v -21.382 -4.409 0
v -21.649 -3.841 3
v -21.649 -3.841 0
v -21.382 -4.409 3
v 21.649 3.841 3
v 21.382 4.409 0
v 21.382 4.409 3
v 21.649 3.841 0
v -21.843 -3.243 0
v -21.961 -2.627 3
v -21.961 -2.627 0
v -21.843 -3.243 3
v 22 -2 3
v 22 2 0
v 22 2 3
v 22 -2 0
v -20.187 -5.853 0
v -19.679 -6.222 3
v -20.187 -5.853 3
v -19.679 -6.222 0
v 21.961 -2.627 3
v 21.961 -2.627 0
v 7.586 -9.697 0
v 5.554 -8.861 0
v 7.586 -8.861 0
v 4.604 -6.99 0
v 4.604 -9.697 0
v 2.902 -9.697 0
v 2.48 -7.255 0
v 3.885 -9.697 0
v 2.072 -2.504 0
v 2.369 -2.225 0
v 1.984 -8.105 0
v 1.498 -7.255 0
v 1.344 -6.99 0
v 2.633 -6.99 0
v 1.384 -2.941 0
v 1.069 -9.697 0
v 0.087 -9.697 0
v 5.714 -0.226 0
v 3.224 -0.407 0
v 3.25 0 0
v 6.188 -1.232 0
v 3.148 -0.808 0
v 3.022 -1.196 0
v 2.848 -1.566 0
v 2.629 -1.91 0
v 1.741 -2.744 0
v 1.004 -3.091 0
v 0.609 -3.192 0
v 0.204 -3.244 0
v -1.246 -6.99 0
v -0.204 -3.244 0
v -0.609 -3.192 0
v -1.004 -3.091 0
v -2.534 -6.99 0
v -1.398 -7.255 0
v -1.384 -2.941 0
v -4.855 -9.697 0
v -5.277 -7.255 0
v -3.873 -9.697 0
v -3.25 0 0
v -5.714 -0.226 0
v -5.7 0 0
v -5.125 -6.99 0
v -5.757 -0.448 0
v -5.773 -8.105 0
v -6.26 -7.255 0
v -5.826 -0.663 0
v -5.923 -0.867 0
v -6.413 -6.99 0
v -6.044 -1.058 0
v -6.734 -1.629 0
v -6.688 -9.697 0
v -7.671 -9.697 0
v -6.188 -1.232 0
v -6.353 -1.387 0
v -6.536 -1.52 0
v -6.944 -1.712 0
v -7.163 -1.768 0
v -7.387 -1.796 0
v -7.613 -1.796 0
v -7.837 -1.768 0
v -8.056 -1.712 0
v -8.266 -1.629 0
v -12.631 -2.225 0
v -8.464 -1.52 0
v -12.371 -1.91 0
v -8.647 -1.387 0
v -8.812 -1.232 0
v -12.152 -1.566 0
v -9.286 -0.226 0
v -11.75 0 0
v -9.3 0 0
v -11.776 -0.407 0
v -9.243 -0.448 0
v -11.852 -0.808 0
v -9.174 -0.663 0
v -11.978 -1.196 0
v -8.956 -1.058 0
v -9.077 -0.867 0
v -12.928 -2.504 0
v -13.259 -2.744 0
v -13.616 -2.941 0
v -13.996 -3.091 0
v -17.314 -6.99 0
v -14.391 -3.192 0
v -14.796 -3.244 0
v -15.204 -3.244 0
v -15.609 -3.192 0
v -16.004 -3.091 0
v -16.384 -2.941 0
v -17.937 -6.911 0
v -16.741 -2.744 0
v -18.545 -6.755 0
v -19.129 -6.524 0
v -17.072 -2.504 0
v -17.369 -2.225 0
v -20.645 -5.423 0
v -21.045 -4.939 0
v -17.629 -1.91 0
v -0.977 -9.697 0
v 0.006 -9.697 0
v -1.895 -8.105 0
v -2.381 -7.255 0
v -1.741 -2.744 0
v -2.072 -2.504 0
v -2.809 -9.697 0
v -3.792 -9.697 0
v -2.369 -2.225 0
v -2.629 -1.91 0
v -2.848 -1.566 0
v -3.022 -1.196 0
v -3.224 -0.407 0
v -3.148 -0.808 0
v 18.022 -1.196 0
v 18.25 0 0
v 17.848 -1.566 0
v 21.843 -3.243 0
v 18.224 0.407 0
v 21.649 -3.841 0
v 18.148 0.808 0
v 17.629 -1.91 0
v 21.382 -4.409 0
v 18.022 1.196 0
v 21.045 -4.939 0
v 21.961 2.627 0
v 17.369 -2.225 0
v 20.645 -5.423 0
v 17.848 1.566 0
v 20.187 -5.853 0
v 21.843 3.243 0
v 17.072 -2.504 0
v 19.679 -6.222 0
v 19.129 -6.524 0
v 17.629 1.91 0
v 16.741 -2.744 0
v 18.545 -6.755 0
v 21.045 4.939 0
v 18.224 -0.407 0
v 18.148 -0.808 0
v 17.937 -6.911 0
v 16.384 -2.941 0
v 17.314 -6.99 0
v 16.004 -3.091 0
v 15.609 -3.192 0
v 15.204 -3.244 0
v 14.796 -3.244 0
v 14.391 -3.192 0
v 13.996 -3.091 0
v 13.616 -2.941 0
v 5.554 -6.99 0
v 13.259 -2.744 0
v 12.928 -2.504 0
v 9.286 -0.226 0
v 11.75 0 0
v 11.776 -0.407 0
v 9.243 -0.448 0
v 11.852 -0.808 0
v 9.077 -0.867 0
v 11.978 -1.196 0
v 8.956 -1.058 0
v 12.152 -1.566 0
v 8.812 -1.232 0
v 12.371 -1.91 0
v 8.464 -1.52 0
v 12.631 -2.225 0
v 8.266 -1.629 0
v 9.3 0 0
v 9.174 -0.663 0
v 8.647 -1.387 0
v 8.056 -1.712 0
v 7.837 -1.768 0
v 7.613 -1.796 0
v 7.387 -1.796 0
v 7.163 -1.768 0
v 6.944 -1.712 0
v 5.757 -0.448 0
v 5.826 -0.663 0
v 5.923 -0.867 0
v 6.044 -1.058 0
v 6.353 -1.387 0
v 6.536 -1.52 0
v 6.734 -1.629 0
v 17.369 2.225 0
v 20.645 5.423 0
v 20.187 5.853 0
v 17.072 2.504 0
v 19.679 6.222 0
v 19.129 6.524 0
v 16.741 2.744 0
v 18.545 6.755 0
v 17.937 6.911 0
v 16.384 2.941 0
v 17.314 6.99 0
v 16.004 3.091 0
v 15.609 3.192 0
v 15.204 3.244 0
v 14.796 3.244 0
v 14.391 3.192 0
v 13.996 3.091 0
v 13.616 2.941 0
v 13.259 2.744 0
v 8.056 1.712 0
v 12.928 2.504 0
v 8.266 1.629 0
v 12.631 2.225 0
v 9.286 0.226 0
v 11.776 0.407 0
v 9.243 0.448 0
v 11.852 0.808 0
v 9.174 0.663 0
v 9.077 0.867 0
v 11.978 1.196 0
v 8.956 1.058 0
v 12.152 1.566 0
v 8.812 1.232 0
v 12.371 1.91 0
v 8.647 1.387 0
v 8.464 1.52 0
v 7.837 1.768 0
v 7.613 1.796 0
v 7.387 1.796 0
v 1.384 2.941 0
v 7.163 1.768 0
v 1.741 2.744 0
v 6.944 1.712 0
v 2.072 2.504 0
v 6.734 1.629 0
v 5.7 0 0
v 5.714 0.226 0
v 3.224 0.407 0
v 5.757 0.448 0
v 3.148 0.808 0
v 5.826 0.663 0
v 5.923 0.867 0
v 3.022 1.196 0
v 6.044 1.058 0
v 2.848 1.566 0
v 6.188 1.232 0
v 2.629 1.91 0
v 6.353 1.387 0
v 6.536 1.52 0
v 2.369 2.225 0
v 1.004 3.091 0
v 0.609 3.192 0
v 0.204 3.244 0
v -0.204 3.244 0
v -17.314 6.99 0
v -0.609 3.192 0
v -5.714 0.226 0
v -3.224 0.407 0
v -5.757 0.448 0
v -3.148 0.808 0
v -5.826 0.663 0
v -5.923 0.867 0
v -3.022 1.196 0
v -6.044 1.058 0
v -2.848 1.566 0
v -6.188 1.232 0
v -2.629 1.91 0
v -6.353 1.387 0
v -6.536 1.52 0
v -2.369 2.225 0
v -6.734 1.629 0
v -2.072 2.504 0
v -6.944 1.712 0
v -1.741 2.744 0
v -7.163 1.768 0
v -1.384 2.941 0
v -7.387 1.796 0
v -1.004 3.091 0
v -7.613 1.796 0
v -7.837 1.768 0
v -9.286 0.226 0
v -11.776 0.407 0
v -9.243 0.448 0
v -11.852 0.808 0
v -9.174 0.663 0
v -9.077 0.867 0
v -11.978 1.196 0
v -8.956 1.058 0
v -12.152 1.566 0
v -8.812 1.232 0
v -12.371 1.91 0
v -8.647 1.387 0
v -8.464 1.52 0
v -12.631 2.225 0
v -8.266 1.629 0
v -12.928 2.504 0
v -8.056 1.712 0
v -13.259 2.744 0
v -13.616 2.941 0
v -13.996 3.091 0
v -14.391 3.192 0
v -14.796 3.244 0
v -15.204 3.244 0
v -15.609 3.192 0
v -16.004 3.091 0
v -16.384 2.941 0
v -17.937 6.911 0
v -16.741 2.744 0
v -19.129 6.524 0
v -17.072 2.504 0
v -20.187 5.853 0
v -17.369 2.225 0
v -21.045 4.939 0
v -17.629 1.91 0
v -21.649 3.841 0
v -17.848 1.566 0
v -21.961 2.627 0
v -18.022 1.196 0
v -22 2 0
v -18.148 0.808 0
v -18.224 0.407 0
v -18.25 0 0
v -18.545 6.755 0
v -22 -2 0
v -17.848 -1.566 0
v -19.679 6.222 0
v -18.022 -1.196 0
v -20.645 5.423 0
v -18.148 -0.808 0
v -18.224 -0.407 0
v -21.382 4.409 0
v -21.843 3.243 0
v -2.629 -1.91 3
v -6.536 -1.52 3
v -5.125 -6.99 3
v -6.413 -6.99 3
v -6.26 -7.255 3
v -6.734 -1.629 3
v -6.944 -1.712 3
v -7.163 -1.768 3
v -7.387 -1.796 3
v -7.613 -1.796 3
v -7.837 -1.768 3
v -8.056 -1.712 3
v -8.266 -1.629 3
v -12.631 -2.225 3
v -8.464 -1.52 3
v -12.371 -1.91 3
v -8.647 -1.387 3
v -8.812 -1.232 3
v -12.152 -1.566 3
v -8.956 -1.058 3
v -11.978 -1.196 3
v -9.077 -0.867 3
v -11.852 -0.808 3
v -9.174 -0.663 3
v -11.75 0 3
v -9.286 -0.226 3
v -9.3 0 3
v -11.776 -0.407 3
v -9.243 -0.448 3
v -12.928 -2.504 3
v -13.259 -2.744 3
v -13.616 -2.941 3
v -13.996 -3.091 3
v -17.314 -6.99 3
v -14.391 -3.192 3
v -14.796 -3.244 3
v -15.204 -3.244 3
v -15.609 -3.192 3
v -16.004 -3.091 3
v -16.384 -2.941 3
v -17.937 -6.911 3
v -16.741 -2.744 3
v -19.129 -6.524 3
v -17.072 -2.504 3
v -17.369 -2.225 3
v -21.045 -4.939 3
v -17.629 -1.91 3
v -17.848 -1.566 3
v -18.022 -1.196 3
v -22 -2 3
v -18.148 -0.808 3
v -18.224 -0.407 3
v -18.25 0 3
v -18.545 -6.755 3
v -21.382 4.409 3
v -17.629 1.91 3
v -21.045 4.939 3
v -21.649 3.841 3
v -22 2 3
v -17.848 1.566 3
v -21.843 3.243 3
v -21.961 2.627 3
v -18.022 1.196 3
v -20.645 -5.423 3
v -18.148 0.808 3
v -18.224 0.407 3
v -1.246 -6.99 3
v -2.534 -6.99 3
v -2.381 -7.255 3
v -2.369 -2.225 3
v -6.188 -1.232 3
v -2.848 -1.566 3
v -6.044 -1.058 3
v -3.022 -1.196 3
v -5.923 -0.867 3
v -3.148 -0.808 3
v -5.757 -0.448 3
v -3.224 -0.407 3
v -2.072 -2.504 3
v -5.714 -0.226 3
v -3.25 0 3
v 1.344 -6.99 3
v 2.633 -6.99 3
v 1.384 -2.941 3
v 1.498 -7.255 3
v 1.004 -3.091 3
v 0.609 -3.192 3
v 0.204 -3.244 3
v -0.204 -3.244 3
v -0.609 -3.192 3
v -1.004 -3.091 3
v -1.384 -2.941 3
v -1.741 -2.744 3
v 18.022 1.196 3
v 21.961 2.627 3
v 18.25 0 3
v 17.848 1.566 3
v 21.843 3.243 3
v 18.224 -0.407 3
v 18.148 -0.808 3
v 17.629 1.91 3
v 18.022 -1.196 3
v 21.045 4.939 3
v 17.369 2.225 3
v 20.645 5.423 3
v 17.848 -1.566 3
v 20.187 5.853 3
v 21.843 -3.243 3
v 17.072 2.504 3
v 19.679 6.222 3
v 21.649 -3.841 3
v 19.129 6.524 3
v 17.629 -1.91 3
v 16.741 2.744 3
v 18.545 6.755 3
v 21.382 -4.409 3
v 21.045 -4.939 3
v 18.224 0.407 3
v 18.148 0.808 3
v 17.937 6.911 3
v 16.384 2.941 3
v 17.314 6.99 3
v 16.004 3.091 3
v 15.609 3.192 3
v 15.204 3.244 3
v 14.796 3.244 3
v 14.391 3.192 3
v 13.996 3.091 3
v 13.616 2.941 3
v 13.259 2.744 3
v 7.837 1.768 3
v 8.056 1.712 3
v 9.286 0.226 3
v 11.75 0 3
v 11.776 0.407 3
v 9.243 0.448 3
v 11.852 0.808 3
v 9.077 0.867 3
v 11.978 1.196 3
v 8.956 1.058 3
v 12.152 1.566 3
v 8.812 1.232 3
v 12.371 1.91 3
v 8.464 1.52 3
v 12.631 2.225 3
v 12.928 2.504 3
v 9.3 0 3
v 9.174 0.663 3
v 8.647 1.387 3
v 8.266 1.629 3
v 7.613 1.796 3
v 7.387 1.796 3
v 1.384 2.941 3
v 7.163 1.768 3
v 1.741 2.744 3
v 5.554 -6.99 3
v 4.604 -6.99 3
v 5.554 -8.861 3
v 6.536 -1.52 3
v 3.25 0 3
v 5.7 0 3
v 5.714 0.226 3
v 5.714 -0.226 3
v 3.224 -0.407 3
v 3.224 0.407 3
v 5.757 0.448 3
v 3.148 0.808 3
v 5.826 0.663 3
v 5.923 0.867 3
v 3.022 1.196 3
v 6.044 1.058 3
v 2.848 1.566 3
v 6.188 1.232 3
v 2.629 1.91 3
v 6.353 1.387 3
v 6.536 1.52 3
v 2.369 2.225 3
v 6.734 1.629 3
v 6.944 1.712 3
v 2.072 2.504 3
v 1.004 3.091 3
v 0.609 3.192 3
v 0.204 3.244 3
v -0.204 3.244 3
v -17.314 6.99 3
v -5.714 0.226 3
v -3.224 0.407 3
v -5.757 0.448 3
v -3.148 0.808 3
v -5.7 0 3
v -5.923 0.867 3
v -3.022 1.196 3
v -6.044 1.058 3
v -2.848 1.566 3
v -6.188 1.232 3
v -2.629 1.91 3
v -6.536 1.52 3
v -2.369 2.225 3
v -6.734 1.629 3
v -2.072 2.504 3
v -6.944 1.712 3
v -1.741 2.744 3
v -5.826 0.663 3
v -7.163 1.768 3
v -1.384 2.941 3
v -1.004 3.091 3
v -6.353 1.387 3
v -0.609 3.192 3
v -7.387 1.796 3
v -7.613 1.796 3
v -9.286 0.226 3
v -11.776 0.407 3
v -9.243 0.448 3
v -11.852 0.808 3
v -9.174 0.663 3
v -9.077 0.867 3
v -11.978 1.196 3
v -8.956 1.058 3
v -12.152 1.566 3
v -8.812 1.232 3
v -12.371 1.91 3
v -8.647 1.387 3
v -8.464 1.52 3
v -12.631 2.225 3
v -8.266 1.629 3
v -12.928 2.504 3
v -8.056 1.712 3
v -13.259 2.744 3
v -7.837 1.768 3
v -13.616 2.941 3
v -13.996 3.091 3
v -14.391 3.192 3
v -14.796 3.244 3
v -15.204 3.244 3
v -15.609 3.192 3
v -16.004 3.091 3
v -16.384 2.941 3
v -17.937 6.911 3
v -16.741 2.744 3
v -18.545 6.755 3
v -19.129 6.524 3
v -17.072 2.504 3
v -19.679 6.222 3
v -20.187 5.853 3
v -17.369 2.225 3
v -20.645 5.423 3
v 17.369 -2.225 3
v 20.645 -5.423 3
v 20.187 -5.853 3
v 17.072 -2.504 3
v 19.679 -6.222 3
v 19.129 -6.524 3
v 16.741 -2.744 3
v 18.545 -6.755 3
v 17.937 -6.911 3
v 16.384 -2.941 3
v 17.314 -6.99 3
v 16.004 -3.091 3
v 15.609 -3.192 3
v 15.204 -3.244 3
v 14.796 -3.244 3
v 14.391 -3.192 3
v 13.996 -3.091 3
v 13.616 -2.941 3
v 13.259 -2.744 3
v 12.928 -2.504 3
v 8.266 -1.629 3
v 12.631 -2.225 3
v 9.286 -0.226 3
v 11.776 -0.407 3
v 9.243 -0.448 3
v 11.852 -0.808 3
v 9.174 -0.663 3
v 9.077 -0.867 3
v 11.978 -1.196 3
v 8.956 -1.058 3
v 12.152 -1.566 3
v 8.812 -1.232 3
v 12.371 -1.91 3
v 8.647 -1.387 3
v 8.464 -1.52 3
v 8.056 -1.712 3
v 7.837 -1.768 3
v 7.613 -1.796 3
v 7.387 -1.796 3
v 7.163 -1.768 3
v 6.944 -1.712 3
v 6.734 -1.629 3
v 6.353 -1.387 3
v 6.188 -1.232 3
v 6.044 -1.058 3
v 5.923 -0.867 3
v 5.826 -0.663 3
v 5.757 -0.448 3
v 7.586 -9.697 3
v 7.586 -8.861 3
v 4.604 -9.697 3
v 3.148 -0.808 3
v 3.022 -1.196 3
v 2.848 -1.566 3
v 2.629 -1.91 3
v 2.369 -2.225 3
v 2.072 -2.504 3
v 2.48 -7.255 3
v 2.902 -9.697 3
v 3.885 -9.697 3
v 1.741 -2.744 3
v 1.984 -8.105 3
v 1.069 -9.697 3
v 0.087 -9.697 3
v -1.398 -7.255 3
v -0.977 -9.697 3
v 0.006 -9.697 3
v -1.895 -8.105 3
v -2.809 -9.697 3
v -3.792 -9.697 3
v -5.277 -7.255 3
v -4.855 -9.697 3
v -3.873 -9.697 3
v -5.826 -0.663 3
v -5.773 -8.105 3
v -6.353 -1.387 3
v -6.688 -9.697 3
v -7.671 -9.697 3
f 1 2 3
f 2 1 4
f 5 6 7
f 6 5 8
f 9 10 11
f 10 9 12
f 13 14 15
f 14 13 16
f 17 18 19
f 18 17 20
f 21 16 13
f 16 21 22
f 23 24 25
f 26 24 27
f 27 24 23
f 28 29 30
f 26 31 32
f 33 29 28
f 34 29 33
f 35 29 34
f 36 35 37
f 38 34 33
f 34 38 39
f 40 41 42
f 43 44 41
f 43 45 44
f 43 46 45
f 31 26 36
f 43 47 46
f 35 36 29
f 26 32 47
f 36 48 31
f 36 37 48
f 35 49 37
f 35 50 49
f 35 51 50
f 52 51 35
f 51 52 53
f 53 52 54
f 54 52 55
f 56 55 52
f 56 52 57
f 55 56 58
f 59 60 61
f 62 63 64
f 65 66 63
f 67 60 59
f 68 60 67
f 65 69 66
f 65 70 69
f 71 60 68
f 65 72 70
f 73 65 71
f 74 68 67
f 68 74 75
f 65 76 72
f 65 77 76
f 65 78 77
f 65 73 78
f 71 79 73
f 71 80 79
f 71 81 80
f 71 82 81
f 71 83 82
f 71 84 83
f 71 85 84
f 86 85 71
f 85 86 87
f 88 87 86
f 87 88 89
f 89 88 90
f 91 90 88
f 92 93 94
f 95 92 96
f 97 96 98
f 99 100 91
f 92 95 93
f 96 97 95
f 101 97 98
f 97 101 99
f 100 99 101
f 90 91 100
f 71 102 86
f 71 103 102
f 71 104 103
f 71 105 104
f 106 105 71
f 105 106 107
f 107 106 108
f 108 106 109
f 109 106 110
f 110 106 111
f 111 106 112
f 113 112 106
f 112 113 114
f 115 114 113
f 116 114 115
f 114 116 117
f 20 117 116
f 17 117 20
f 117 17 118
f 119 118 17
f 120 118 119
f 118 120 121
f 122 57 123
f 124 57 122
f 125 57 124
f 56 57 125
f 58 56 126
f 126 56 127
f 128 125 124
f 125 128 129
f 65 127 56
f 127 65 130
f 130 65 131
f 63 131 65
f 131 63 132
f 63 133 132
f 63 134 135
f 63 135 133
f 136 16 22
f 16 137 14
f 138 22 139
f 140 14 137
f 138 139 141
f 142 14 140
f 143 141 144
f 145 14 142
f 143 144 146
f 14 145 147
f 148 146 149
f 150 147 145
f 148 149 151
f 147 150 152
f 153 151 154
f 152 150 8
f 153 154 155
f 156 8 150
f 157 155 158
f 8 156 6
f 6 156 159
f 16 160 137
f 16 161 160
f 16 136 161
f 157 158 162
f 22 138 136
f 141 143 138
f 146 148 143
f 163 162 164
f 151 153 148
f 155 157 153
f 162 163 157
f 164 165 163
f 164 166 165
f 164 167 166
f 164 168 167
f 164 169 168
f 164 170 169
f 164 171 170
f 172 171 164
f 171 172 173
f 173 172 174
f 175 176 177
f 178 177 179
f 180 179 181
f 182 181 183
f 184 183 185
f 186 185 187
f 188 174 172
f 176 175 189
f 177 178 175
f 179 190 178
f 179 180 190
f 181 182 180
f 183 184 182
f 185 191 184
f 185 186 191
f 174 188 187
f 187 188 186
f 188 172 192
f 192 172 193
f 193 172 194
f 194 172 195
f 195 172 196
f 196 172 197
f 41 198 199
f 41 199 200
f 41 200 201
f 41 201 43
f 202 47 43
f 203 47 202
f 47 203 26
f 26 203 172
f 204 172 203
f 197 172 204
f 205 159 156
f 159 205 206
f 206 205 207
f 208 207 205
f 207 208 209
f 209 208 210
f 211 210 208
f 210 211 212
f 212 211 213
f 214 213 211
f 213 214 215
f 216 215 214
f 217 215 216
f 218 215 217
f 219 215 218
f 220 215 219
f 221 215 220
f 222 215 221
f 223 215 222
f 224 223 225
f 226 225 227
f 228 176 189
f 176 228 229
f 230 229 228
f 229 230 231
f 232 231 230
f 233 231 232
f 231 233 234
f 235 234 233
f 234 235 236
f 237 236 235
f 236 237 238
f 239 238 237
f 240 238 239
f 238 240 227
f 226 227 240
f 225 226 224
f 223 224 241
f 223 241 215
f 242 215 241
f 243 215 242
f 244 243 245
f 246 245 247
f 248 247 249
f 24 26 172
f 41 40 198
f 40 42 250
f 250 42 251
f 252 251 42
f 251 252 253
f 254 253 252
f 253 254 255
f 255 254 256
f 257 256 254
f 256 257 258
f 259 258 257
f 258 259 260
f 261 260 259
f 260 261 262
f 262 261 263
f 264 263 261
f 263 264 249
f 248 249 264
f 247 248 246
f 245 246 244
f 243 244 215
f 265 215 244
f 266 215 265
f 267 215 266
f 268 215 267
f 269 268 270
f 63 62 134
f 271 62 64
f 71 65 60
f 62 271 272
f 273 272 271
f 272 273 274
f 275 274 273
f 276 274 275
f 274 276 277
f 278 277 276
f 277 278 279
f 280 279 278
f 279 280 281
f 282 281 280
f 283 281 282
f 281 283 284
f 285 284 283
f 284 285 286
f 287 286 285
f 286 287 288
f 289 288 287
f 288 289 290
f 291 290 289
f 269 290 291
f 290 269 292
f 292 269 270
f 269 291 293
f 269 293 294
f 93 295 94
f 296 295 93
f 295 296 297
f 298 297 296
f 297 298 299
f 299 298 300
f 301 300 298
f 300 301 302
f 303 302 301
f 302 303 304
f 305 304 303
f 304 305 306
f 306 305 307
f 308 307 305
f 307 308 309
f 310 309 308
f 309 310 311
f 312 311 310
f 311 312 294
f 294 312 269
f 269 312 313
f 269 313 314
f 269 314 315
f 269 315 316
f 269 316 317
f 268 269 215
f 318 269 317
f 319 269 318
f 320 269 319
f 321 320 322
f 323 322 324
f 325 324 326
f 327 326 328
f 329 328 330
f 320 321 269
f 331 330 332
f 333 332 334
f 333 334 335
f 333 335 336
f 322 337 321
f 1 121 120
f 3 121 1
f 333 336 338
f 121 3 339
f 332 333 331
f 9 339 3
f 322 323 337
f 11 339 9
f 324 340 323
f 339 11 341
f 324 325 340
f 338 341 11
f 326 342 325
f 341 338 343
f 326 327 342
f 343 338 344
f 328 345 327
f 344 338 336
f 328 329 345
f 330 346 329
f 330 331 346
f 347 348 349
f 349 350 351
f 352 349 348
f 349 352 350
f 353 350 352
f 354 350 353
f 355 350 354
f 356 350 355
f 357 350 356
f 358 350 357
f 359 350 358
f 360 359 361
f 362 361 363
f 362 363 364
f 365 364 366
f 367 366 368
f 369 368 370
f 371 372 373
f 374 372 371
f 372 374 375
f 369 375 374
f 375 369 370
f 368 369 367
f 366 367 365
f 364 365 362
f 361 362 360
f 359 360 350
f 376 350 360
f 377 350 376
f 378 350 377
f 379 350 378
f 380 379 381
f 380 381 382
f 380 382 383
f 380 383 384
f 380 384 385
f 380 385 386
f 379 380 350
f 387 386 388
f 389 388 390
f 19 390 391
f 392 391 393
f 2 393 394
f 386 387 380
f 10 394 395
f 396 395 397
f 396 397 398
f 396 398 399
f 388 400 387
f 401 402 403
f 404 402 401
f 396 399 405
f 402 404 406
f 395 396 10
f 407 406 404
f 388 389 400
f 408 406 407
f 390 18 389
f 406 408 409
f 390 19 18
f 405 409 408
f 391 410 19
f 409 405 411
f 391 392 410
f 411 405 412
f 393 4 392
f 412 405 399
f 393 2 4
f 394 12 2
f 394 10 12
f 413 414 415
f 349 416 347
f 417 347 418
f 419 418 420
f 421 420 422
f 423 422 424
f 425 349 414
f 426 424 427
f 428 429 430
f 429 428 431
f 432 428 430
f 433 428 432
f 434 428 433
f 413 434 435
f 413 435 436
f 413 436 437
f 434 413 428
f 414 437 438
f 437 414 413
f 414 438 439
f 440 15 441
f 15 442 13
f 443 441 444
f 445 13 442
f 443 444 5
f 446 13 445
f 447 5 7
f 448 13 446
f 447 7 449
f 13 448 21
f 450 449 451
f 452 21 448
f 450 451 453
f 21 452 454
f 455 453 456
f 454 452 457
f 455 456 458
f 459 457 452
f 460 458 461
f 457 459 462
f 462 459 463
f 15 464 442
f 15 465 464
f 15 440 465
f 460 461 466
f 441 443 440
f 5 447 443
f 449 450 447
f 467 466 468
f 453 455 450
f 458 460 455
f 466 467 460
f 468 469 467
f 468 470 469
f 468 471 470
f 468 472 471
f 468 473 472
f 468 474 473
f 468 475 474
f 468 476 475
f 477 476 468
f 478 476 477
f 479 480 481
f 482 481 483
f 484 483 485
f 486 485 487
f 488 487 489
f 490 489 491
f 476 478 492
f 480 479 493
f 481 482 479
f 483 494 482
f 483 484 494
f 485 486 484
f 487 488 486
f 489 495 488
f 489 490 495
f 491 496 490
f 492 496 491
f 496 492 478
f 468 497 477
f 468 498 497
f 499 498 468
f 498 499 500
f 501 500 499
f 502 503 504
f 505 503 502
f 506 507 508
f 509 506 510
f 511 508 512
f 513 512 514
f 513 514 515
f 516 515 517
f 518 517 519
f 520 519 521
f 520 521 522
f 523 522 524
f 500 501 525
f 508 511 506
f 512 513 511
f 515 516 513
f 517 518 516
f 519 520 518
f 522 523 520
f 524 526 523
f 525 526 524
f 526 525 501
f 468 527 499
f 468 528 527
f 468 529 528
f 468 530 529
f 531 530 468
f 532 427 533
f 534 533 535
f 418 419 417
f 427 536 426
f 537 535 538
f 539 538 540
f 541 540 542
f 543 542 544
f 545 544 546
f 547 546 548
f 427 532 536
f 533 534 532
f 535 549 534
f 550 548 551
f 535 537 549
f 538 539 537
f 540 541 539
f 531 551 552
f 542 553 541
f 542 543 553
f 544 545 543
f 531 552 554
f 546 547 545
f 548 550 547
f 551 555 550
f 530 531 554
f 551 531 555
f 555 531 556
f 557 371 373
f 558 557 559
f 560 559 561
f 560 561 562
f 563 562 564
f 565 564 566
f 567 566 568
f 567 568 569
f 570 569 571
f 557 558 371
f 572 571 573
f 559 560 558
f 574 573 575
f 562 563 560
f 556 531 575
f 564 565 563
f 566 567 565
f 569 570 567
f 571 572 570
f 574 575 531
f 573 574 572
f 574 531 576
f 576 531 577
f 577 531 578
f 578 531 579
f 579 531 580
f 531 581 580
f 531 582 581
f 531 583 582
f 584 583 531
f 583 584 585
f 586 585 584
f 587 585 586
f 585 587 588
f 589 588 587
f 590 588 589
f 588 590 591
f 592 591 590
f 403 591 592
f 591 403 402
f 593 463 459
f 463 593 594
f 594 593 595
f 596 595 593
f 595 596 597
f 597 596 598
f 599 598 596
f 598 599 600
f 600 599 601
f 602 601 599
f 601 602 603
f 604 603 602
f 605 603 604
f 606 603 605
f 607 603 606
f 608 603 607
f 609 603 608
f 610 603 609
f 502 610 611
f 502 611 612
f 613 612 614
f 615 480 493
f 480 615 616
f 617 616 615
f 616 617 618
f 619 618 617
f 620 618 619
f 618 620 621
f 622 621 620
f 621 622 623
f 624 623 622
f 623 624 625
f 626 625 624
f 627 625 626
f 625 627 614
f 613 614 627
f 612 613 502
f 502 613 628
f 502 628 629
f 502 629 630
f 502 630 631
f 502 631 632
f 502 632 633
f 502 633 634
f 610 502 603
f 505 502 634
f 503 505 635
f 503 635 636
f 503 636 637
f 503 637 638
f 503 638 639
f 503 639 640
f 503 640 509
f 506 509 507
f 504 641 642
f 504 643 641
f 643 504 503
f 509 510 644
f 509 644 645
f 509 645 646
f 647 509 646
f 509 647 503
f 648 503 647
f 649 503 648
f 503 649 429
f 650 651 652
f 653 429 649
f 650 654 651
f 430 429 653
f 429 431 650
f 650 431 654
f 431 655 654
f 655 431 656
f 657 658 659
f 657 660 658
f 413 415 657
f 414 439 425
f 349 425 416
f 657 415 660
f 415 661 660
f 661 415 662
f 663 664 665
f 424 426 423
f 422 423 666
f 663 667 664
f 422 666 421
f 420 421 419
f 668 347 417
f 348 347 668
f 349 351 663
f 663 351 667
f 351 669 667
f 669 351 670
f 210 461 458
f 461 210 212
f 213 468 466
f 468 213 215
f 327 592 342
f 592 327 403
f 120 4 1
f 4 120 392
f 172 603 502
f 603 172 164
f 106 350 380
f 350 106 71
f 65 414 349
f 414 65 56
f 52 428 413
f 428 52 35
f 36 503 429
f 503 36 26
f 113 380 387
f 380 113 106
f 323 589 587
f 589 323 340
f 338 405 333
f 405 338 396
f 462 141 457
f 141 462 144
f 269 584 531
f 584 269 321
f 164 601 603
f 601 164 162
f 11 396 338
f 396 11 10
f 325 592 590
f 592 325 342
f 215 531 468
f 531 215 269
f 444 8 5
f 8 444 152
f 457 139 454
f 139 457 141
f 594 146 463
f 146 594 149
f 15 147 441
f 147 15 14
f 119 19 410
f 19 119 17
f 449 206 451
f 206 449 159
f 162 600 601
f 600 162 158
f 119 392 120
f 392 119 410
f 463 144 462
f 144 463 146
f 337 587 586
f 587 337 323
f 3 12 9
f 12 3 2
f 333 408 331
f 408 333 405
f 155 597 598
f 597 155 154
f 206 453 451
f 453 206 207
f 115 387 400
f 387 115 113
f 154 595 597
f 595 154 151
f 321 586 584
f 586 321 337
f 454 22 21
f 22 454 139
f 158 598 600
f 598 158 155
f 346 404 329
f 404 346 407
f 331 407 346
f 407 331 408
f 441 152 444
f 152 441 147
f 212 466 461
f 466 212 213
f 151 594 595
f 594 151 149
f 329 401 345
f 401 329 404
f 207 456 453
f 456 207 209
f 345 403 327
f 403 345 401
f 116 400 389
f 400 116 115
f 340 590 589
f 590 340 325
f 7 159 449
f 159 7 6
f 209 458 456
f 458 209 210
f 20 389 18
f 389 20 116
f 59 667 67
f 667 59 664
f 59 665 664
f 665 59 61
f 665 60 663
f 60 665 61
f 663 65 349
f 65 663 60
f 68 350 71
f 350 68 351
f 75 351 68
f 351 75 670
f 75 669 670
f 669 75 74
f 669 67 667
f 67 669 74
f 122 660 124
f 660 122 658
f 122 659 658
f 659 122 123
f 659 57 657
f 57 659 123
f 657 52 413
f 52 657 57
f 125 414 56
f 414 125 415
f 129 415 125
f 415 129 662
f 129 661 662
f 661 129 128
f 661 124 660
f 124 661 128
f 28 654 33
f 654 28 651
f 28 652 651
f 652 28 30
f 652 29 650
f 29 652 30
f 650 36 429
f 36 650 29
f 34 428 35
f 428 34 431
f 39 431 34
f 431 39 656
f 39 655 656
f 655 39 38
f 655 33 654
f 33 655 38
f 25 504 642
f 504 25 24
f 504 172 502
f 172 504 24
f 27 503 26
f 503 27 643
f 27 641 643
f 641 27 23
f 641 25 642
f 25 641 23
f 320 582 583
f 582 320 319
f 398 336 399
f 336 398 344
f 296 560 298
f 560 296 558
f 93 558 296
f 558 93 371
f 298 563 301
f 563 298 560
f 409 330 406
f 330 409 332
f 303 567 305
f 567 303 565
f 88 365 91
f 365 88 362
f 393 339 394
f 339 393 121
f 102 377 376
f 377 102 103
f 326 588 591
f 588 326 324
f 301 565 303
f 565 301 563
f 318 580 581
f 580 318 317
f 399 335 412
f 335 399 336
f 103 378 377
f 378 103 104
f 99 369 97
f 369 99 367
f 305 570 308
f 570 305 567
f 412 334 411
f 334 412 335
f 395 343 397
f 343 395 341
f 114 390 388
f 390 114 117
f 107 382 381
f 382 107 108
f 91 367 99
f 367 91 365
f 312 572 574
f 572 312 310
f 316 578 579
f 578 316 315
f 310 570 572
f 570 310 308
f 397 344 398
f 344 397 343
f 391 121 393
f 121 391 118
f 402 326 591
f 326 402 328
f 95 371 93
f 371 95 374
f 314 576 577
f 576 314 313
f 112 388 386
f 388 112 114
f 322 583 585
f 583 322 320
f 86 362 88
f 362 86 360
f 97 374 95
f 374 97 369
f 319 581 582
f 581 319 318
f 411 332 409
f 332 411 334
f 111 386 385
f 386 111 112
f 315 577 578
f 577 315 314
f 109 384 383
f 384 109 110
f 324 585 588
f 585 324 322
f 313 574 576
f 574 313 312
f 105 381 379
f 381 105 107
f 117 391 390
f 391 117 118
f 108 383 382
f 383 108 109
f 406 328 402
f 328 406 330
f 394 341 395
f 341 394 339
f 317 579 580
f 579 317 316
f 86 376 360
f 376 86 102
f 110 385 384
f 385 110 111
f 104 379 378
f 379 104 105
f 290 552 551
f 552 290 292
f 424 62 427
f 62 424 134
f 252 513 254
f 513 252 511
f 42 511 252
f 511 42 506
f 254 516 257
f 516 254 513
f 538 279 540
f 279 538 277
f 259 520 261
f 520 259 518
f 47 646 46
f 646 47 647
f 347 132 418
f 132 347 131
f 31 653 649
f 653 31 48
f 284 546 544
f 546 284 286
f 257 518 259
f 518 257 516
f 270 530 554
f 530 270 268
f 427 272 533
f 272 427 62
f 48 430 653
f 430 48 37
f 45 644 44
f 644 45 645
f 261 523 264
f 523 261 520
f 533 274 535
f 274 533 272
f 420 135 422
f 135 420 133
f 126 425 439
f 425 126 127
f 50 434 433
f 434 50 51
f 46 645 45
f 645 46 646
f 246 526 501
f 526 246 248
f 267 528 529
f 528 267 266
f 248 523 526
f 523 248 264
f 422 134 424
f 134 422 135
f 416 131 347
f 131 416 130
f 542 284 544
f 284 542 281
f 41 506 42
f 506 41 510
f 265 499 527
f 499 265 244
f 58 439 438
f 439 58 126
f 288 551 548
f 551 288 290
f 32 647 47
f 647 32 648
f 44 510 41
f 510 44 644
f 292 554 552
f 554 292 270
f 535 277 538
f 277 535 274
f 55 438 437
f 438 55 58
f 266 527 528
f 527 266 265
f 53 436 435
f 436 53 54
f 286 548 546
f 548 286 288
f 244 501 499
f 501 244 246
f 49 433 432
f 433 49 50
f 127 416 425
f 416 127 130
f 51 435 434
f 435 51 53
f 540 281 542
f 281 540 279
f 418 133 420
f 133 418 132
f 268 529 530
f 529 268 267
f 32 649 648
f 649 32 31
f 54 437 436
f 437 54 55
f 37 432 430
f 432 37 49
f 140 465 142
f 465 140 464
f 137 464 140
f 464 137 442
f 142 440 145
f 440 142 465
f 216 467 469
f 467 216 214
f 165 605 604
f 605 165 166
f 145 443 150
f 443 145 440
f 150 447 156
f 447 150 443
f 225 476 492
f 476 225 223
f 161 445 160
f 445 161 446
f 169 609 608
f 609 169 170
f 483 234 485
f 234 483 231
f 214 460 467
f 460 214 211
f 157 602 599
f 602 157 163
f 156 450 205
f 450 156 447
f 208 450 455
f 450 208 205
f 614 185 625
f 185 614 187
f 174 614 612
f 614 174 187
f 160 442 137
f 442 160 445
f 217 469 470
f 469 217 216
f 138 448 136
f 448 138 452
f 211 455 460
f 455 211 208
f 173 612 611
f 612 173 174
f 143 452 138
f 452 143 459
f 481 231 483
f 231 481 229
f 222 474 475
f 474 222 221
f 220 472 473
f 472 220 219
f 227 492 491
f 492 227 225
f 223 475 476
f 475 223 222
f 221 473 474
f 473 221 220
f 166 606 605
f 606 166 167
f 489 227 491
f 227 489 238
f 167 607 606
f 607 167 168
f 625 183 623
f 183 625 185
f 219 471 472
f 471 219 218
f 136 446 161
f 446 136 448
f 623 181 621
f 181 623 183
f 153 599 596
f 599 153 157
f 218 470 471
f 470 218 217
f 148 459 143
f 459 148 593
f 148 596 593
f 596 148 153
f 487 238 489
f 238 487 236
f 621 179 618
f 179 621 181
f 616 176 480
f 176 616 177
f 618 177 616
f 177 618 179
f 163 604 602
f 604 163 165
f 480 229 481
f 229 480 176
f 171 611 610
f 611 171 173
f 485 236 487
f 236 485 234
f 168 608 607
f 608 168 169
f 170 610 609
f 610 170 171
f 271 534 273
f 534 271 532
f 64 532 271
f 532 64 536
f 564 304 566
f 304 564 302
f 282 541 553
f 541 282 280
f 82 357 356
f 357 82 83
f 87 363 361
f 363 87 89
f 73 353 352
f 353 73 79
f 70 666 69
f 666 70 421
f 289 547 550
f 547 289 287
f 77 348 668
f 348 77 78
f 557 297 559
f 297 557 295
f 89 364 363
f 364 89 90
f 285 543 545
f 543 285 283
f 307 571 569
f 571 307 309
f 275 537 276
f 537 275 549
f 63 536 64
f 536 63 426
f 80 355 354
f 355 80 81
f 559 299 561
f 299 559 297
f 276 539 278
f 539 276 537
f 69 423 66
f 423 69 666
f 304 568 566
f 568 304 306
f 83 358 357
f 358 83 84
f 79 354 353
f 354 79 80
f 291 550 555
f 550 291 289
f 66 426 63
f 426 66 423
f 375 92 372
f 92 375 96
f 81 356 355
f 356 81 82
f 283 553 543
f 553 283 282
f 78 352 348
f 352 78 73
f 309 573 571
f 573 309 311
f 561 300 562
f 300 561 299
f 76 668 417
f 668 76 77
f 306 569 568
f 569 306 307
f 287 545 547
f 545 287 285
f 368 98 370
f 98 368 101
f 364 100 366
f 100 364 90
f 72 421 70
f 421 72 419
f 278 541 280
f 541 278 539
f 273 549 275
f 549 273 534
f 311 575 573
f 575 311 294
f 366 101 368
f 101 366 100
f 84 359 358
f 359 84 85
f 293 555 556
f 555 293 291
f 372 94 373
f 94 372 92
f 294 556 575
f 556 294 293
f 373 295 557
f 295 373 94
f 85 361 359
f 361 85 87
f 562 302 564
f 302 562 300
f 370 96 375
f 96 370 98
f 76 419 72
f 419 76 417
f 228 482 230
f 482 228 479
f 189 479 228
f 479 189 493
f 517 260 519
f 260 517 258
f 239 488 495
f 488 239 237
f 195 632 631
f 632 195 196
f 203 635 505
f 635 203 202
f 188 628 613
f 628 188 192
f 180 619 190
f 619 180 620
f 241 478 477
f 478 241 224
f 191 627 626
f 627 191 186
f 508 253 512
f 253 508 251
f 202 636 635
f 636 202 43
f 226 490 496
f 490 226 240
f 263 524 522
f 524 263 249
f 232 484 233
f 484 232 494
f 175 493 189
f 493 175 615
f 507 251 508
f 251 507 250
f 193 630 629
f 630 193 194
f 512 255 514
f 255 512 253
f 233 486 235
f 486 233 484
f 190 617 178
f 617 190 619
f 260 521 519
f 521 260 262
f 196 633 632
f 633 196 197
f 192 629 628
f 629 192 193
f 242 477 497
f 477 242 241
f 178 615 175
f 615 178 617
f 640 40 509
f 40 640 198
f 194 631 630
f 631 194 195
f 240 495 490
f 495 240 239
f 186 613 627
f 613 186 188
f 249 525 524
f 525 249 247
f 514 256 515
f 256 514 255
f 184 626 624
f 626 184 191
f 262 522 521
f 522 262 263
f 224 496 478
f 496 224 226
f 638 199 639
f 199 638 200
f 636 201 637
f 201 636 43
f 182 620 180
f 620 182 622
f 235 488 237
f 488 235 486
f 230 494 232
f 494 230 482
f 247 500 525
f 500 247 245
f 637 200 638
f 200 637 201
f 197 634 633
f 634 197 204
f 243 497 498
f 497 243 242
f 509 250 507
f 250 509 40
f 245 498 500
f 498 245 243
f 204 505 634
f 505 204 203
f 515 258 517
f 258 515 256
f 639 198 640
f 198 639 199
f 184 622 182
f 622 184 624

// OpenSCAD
$fn = 50;


difference() {
	union() {
		hull() {
			translate(v = [-17.0000000000, 2.0000000000, 0]) {
				cylinder(h = 3, r = 5);
			}
			translate(v = [17.0000000000, 2.0000000000, 0]) {
				cylinder(h = 3, r = 5);
			}
			translate(v = [-17.0000000000, -2.0000000000, 0]) {
				cylinder(h = 3, r = 5);
			}
			translate(v = [17.0000000000, -2.0000000000, 0]) {
				cylinder(h = 3, r = 5);
			}
		}
		translate(v = [0, -5, 0]) {
			linear_extrude(height = 3) {
				text(font = "DejaVu Sans Mono:style=Bold", halign = "center", size = 4.7500000000, text = "XXXL", valign = "top");
			}
		}
	}
	union() {
		translate(v = [-15.0000000000, 0.0000000000, 0]) {
			translate(v = [0, 0, -100]) {
				cylinder(h = 200, r = 3.2500000000);
			}
		}
		translate(v = [0, 0, -100]) {
			cylinder(h = 200, r = 3.2500000000);
		}
		translate(v = [15.0000000000, 0.0000000000, 0]) {
			translate(v = [0, 0, -100]) {
				cylinder(h = 200, r = 3.2500000000);
			}
		}
		translate(v = [-15.0000000000, 0.0000000000, 0]) {
			translate(v = [0, 0, -100]) {
				cylinder(h = 200, r = 1.8000000000);
			}
		}
		translate(v = [-7.5000000000, 0.0000000000, 0]) {
			translate(v = [0, 0, -100]) {
				cylinder(h = 200, r = 1.8000000000);
			}
		}
		translate(v = [0, 0, -100]) {
			cylinder(h = 200, r = 1.8000000000);
		}
		translate(v = [7.5000000000, 0.0000000000, 0]) {
			translate(v = [0, 0, -100]) {
				cylinder(h = 200, r = 1.8000000000);
			}
		}
		translate(v = [15.0000000000, 0.0000000000, 0]) {
			translate(v = [0, 0, -100]) {
				cylinder(h = 200, r = 1.8000000000);
			}
		}
	}
}
